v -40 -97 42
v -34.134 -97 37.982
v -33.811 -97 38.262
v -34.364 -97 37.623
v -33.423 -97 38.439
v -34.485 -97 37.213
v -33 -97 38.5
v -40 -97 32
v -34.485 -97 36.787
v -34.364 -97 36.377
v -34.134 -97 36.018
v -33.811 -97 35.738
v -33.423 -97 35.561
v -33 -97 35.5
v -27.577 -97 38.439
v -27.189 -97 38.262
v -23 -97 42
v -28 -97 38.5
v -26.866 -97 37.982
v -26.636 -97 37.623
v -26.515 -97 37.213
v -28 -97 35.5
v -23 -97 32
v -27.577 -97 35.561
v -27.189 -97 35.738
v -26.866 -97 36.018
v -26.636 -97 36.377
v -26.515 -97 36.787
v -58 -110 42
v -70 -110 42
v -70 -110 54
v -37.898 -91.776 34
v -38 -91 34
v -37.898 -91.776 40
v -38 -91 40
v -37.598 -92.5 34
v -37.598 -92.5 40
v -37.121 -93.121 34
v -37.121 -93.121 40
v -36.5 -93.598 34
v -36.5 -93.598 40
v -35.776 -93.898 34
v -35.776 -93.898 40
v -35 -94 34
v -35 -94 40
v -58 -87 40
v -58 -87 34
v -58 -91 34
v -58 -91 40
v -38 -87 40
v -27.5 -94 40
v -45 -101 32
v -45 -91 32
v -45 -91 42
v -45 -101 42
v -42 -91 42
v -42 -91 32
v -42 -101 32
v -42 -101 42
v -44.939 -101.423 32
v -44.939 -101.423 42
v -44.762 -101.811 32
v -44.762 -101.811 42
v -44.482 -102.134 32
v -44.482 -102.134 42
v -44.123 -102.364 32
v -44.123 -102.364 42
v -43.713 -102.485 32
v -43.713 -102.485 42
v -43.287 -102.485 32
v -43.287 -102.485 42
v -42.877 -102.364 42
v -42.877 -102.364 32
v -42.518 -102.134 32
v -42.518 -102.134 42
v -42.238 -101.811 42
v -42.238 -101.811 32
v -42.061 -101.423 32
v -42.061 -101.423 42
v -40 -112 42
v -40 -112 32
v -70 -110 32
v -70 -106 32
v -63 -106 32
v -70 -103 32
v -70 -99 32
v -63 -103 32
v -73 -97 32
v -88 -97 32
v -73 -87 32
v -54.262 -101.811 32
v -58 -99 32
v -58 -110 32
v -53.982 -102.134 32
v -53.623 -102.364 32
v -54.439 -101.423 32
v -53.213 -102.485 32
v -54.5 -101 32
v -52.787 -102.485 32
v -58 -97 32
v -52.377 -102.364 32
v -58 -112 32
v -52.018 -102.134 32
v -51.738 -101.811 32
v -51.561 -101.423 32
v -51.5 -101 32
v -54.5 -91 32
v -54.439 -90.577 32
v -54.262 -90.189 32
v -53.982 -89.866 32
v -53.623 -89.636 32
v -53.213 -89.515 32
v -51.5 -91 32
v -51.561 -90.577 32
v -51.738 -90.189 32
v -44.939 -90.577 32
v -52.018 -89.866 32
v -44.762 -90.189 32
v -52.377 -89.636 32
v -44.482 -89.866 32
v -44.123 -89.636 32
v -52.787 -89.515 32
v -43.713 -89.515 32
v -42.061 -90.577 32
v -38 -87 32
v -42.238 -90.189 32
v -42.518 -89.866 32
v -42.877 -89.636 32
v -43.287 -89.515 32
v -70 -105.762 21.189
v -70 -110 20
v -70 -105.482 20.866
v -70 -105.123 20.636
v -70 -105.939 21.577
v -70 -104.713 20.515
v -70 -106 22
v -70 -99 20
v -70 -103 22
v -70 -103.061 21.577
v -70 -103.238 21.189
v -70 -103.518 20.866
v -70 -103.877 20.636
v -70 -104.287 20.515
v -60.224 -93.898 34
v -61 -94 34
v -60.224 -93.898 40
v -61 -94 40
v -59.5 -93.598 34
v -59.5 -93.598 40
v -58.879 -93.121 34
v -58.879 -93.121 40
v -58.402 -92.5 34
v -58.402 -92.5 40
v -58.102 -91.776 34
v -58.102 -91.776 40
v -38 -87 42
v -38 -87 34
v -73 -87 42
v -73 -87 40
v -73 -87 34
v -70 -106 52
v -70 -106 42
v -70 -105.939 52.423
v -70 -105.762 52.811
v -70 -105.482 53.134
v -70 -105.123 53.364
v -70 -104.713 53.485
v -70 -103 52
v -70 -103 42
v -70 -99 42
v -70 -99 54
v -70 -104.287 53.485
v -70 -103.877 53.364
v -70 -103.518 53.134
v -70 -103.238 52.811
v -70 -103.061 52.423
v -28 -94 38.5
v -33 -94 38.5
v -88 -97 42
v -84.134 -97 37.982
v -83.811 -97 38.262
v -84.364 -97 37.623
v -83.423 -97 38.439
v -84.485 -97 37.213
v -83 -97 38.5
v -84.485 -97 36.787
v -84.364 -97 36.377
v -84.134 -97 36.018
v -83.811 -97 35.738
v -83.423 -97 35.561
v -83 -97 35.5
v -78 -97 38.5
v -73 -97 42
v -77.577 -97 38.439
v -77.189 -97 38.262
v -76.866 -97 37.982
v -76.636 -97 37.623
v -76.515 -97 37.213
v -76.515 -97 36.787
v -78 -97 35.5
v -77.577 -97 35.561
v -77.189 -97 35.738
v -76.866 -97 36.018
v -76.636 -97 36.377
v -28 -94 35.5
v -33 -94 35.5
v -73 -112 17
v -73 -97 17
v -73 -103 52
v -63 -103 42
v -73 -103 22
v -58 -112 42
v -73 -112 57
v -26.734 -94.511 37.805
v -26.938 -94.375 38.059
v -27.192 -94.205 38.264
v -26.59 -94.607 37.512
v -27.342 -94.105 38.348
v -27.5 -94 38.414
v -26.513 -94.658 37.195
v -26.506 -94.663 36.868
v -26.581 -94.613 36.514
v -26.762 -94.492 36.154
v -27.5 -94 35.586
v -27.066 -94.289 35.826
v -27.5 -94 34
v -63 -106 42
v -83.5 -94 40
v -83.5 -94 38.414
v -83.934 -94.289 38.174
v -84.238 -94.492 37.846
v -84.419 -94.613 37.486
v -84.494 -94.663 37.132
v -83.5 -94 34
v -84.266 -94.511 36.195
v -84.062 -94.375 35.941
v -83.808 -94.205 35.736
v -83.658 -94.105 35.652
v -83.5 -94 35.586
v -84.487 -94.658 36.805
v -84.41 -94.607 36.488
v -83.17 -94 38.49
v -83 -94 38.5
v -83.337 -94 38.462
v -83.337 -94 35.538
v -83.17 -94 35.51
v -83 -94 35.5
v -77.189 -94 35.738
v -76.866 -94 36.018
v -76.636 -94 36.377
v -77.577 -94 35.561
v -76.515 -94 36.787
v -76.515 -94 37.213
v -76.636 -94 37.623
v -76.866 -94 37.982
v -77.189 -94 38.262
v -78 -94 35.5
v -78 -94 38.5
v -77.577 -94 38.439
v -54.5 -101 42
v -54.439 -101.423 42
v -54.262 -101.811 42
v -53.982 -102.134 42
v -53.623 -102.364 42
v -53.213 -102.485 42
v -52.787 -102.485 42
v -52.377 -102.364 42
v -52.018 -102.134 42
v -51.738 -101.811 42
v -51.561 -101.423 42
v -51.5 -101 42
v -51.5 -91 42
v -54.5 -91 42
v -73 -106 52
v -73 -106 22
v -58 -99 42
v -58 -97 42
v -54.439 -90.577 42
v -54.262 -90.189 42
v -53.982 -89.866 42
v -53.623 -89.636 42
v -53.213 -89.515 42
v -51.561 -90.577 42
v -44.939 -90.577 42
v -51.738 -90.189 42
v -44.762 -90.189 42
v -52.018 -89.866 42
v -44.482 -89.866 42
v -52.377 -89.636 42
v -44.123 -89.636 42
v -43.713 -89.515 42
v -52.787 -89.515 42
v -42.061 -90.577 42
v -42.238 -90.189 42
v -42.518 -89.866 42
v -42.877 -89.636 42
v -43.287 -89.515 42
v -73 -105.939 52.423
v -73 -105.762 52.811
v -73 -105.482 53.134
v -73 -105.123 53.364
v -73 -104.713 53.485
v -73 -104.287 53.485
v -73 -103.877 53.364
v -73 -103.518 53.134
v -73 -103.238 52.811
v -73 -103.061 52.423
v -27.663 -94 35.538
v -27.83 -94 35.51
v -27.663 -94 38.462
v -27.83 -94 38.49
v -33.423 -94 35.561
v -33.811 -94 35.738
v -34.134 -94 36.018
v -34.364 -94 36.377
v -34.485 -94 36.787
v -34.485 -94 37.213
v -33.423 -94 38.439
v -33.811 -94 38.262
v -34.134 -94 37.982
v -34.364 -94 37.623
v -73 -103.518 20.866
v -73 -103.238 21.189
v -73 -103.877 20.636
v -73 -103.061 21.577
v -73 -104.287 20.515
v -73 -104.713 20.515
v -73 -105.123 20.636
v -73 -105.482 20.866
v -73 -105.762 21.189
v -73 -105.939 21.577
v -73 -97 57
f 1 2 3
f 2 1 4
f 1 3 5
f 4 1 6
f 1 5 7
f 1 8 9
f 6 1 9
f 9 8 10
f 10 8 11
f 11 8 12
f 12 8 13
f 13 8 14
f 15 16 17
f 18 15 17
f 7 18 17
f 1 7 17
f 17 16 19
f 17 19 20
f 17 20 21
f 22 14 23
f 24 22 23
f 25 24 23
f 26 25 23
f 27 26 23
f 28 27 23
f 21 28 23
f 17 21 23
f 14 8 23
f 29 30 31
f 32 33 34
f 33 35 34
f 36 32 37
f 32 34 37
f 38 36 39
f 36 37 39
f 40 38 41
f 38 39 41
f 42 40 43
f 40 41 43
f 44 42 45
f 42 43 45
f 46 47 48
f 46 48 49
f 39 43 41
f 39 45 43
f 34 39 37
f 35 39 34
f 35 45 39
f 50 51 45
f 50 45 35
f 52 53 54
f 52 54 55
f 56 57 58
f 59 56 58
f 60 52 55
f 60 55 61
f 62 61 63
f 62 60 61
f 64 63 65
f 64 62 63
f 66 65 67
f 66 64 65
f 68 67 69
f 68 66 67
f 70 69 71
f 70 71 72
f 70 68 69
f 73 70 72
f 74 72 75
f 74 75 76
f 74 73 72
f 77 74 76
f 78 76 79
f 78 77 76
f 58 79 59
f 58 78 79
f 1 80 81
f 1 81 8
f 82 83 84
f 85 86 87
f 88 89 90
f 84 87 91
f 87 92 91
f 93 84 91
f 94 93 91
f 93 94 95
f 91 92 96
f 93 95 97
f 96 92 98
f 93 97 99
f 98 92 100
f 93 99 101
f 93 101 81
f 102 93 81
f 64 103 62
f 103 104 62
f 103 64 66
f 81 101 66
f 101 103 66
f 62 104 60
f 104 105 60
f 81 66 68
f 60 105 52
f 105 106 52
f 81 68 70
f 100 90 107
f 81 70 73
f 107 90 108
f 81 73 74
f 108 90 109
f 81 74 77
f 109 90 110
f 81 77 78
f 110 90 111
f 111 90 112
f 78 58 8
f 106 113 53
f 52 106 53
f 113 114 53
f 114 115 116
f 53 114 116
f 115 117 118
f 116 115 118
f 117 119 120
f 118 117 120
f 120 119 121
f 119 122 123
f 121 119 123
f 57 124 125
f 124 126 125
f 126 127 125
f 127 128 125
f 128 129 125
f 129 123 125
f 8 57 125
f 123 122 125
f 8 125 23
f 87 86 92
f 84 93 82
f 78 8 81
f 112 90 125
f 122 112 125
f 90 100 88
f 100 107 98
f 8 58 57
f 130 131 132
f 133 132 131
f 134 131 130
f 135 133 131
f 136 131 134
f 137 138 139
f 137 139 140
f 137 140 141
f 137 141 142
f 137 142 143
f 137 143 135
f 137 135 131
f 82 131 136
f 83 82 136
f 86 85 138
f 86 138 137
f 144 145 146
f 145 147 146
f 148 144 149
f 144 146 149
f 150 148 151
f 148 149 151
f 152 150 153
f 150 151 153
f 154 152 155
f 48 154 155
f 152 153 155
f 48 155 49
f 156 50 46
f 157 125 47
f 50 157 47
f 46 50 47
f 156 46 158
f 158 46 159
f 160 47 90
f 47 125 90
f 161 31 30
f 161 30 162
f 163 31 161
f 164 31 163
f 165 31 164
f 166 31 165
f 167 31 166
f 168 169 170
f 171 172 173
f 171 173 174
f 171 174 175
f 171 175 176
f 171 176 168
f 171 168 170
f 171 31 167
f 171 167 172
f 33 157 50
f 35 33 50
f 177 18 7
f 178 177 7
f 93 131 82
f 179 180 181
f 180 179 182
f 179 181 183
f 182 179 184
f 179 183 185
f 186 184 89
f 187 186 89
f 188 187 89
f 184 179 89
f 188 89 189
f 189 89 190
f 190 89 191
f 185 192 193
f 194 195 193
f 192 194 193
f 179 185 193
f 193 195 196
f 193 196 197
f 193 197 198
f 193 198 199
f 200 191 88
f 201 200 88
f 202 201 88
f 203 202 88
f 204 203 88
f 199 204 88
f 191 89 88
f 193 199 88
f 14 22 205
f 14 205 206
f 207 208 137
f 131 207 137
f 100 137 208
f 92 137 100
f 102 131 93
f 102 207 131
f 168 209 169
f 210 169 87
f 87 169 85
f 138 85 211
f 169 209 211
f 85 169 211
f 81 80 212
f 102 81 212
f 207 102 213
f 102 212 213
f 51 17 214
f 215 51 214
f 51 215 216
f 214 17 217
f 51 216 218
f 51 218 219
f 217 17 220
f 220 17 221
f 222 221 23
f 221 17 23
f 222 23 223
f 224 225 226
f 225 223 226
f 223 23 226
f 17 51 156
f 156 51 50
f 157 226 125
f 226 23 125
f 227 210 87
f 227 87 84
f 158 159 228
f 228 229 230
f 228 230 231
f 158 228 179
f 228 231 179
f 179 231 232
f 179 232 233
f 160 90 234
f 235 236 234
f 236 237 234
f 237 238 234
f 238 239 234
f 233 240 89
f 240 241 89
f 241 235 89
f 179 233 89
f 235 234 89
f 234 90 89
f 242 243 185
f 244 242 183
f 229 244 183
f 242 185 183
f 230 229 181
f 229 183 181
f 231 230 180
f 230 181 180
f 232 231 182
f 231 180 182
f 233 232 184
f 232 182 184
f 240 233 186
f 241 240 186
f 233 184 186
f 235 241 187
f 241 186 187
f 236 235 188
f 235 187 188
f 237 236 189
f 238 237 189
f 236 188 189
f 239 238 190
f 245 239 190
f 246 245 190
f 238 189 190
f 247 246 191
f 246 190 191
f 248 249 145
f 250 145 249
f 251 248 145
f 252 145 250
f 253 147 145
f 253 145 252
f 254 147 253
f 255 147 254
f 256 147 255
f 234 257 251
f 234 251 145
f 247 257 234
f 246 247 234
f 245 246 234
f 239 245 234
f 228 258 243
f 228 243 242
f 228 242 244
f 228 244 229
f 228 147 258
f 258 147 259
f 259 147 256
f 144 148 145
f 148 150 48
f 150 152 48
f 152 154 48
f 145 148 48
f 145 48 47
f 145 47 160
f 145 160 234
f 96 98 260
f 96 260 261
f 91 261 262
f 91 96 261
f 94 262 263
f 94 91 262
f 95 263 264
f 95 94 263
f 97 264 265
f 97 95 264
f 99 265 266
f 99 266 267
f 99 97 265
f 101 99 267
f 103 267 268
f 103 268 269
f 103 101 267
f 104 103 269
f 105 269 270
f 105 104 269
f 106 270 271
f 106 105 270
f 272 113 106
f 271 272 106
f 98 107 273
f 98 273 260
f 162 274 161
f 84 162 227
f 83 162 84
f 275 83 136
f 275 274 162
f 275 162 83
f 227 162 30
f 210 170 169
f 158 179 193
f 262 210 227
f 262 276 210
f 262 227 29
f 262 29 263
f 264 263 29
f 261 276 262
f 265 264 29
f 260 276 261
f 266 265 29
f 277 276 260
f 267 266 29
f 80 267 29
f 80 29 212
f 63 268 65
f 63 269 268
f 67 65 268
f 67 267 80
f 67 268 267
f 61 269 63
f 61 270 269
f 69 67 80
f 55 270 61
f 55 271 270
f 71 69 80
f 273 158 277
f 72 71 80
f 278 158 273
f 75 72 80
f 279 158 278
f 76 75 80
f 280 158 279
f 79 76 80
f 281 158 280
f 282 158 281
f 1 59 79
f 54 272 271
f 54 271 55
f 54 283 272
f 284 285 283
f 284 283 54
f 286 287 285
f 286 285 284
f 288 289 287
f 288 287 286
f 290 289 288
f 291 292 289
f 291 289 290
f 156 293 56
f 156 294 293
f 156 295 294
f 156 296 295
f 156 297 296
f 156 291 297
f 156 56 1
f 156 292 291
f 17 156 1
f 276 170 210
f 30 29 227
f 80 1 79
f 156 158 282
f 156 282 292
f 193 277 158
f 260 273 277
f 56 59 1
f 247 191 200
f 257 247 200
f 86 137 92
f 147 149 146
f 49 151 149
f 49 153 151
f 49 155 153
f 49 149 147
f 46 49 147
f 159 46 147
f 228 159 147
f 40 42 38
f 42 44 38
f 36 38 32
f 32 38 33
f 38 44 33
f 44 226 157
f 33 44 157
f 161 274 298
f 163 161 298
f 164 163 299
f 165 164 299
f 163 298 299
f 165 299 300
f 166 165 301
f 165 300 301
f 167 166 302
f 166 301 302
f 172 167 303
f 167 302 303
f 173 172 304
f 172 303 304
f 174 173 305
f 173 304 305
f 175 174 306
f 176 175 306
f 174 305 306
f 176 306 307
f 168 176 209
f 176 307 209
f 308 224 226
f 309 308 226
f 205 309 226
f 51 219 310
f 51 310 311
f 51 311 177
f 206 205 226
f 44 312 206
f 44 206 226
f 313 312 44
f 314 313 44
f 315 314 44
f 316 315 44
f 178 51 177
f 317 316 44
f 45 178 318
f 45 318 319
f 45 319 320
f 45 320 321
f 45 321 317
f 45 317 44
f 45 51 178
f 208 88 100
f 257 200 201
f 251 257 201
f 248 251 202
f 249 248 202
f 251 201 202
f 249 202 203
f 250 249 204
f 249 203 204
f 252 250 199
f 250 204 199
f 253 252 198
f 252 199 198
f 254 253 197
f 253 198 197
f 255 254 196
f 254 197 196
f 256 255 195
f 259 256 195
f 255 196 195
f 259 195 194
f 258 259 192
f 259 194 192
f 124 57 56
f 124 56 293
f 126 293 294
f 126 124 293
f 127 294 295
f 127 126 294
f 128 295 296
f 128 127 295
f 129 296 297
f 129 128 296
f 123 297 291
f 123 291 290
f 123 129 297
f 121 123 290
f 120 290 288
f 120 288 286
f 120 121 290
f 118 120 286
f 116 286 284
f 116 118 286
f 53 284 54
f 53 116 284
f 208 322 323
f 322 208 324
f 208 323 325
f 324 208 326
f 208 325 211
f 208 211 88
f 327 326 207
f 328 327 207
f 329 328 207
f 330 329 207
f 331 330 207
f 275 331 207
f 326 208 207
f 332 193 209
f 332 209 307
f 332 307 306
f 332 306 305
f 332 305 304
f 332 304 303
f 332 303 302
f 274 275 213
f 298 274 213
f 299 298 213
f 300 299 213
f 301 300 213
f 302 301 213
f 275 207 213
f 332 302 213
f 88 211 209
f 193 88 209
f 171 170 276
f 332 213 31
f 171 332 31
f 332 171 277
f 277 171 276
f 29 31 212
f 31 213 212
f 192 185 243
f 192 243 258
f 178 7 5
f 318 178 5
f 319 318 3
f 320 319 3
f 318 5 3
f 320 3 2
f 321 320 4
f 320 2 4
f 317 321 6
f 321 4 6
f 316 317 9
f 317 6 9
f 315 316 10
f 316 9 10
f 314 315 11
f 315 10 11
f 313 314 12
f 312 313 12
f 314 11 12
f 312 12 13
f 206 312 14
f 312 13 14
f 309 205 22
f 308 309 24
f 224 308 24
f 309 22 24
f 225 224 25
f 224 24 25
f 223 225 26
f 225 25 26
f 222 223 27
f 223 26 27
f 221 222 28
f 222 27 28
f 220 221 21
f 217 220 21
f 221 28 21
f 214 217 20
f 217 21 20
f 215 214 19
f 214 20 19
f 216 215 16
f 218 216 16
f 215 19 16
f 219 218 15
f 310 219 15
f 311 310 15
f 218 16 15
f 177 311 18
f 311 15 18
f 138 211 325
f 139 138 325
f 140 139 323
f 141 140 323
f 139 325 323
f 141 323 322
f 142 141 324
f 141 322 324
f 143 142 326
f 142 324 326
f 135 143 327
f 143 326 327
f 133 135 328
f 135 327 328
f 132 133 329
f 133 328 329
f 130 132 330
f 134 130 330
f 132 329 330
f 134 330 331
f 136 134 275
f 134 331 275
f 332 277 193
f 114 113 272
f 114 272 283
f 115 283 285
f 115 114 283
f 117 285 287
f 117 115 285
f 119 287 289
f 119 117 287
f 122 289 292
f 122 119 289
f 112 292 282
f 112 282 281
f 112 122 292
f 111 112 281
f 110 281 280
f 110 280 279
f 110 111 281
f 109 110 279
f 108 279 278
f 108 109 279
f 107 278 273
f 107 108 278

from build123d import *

# Parameters (mm, degrees)
PAD015_DEPTH    = 10
PAD016_DEPTH    = 15
SKETCH104_W     = 17.509207
SKETCH104_H     = 6
SKETCH104_W_2   = 32.035683
POCKET034_DEPTH = 7
POCKET035_DEPTH = 5
FILLET011_R     = 3
SKETCH106_W     = 11
SKETCH106_H     = 13
POCKET036_DEPTH = 32
POCKET037_DEPTH = 10
SKETCH108_W     = 15
SKETCH108_H     = 10
POCKET038_DEPTH = 2


with BuildPart() as part:
    # Sketch102 → Pad015 (new body)
    with BuildSketch(Plane.XY):
        Polygon((0, 0), (0, 15), (15, 15), (0, 25), (-35, 25), (-50, 15), (-35, 15), (-35, 0), align=None)
        with BuildLine():
            ThreePointArc((-4, 21), (-5.5, 22.5), (-7, 21))
            Line((-7, 21), (-7, 11))
            ThreePointArc((-7, 11), (-5.5, 9.5), (-4, 11))
            Line((-4, 21), (-4, 11))
        make_face(mode=Mode.SUBTRACT)
        with BuildLine():
            ThreePointArc((-13.5, 21), (-15, 22.5), (-16.5, 21))
            Line((-16.5, 21), (-16.5, 11))
            ThreePointArc((-16.5, 11), (-15, 9.5), (-13.5, 11))
            Line((-13.5, 21), (-13.5, 11))
        make_face(mode=Mode.SUBTRACT)
    extrude(amount=PAD015_DEPTH)

    # Sketch103 (on Face2 of Pad015) → Pad016 (join)
    with BuildSketch(Plane.XZ):
        Polygon((-35, 10), (-35, 25), (-20, 10), align=None)
        Polygon((-20, 0), (-35, 0), (-35, -15), align=None)
    extrude(amount=-PAD016_DEPTH)

    # Sketch104 (on Face10 of Pad016) → Pocket034 (cut)
    with BuildSketch(Plane(origin=(0, 25, 0), x_dir=(-1, 0, 0), z_dir=(0, 1, 0))):
        with Locations((-8.754603, 5)):
            Rectangle(SKETCH104_W, SKETCH104_H)
        with Locations((36.017842, 5)):
            Rectangle(SKETCH104_W_2, SKETCH104_H)
    extrude(amount=-POCKET034_DEPTH, mode=Mode.SUBTRACT)

    # Sketch105 (on Face1 of Pocket034) → Pocket035 (cut)
    with BuildSketch(Plane.XZ.offset(-15)):
        with BuildLine():
            ThreePointArc((10, 3.5), (11.5, 5), (10, 6.5))
            Line((10, 6.5), (5, 6.5))
            ThreePointArc((5, 6.5), (3.5, 5), (5, 3.5))
            Line((10, 3.5), (5, 3.5))
        make_face()
        with BuildLine():
            ThreePointArc((-45, 6.5), (-46.5, 5), (-45, 3.5))
            Line((-45, 3.5), (-40, 3.5))
            ThreePointArc((-40, 3.5), (-38.5, 5), (-40, 6.5))
            Line((-45, 6.5), (-40, 6.5))
        make_face()
    extrude(amount=-POCKET035_DEPTH, mode=Mode.SUBTRACT)

    # Fillet011
    fillet011_edges = [part.edges().sort_by_distance(p)[0] for p in [
        (-20, 18, 5),
        (0, 18, 5),
    ]]
    fillet(fillet011_edges, radius=FILLET011_R)

    # Sketch106 (on Face18 of Fillet011) → Pocket036 (cut)
    with BuildSketch(Plane.YZ):
        with Locations((7.5, 16.5)):
            Rectangle(SKETCH106_W, SKETCH106_H)
        with Locations((7.5, -6.5)):
            Rectangle(SKETCH106_W, SKETCH106_H)
    extrude(amount=-POCKET036_DEPTH, mode=Mode.SUBTRACT)

    # Sketch107 (on Face17 of Pocket036) → Pocket037 (cut)
    with BuildSketch(Plane(origin=(-35, 0, 0), x_dir=(0, -1, 0), z_dir=(-1, 0, 0))):
        with BuildLine():
            ThreePointArc((-6, 20), (-7.5, 21.5), (-9, 20))
            Line((-9, 20), (-9, -10))
            ThreePointArc((-9, -10), (-7.5, -11.5), (-6, -10))
            Line((-6, 20), (-6, -10))
        make_face()
    extrude(amount=-POCKET037_DEPTH, mode=Mode.SUBTRACT)

    # Sketch108 (on Face26 of Pocket037) → Pocket038 (cut)
    with BuildSketch(Plane.YZ):
        with Locations((7.5, 5)):
            Rectangle(SKETCH108_W, SKETCH108_H)
    extrude(amount=-POCKET038_DEPTH, mode=Mode.SUBTRACT)


with BuildPart() as part_1:
    # Body008 placement: moved
    add(part.part.moved(Location((-38, -112, 32))))


solid = part_1.part
